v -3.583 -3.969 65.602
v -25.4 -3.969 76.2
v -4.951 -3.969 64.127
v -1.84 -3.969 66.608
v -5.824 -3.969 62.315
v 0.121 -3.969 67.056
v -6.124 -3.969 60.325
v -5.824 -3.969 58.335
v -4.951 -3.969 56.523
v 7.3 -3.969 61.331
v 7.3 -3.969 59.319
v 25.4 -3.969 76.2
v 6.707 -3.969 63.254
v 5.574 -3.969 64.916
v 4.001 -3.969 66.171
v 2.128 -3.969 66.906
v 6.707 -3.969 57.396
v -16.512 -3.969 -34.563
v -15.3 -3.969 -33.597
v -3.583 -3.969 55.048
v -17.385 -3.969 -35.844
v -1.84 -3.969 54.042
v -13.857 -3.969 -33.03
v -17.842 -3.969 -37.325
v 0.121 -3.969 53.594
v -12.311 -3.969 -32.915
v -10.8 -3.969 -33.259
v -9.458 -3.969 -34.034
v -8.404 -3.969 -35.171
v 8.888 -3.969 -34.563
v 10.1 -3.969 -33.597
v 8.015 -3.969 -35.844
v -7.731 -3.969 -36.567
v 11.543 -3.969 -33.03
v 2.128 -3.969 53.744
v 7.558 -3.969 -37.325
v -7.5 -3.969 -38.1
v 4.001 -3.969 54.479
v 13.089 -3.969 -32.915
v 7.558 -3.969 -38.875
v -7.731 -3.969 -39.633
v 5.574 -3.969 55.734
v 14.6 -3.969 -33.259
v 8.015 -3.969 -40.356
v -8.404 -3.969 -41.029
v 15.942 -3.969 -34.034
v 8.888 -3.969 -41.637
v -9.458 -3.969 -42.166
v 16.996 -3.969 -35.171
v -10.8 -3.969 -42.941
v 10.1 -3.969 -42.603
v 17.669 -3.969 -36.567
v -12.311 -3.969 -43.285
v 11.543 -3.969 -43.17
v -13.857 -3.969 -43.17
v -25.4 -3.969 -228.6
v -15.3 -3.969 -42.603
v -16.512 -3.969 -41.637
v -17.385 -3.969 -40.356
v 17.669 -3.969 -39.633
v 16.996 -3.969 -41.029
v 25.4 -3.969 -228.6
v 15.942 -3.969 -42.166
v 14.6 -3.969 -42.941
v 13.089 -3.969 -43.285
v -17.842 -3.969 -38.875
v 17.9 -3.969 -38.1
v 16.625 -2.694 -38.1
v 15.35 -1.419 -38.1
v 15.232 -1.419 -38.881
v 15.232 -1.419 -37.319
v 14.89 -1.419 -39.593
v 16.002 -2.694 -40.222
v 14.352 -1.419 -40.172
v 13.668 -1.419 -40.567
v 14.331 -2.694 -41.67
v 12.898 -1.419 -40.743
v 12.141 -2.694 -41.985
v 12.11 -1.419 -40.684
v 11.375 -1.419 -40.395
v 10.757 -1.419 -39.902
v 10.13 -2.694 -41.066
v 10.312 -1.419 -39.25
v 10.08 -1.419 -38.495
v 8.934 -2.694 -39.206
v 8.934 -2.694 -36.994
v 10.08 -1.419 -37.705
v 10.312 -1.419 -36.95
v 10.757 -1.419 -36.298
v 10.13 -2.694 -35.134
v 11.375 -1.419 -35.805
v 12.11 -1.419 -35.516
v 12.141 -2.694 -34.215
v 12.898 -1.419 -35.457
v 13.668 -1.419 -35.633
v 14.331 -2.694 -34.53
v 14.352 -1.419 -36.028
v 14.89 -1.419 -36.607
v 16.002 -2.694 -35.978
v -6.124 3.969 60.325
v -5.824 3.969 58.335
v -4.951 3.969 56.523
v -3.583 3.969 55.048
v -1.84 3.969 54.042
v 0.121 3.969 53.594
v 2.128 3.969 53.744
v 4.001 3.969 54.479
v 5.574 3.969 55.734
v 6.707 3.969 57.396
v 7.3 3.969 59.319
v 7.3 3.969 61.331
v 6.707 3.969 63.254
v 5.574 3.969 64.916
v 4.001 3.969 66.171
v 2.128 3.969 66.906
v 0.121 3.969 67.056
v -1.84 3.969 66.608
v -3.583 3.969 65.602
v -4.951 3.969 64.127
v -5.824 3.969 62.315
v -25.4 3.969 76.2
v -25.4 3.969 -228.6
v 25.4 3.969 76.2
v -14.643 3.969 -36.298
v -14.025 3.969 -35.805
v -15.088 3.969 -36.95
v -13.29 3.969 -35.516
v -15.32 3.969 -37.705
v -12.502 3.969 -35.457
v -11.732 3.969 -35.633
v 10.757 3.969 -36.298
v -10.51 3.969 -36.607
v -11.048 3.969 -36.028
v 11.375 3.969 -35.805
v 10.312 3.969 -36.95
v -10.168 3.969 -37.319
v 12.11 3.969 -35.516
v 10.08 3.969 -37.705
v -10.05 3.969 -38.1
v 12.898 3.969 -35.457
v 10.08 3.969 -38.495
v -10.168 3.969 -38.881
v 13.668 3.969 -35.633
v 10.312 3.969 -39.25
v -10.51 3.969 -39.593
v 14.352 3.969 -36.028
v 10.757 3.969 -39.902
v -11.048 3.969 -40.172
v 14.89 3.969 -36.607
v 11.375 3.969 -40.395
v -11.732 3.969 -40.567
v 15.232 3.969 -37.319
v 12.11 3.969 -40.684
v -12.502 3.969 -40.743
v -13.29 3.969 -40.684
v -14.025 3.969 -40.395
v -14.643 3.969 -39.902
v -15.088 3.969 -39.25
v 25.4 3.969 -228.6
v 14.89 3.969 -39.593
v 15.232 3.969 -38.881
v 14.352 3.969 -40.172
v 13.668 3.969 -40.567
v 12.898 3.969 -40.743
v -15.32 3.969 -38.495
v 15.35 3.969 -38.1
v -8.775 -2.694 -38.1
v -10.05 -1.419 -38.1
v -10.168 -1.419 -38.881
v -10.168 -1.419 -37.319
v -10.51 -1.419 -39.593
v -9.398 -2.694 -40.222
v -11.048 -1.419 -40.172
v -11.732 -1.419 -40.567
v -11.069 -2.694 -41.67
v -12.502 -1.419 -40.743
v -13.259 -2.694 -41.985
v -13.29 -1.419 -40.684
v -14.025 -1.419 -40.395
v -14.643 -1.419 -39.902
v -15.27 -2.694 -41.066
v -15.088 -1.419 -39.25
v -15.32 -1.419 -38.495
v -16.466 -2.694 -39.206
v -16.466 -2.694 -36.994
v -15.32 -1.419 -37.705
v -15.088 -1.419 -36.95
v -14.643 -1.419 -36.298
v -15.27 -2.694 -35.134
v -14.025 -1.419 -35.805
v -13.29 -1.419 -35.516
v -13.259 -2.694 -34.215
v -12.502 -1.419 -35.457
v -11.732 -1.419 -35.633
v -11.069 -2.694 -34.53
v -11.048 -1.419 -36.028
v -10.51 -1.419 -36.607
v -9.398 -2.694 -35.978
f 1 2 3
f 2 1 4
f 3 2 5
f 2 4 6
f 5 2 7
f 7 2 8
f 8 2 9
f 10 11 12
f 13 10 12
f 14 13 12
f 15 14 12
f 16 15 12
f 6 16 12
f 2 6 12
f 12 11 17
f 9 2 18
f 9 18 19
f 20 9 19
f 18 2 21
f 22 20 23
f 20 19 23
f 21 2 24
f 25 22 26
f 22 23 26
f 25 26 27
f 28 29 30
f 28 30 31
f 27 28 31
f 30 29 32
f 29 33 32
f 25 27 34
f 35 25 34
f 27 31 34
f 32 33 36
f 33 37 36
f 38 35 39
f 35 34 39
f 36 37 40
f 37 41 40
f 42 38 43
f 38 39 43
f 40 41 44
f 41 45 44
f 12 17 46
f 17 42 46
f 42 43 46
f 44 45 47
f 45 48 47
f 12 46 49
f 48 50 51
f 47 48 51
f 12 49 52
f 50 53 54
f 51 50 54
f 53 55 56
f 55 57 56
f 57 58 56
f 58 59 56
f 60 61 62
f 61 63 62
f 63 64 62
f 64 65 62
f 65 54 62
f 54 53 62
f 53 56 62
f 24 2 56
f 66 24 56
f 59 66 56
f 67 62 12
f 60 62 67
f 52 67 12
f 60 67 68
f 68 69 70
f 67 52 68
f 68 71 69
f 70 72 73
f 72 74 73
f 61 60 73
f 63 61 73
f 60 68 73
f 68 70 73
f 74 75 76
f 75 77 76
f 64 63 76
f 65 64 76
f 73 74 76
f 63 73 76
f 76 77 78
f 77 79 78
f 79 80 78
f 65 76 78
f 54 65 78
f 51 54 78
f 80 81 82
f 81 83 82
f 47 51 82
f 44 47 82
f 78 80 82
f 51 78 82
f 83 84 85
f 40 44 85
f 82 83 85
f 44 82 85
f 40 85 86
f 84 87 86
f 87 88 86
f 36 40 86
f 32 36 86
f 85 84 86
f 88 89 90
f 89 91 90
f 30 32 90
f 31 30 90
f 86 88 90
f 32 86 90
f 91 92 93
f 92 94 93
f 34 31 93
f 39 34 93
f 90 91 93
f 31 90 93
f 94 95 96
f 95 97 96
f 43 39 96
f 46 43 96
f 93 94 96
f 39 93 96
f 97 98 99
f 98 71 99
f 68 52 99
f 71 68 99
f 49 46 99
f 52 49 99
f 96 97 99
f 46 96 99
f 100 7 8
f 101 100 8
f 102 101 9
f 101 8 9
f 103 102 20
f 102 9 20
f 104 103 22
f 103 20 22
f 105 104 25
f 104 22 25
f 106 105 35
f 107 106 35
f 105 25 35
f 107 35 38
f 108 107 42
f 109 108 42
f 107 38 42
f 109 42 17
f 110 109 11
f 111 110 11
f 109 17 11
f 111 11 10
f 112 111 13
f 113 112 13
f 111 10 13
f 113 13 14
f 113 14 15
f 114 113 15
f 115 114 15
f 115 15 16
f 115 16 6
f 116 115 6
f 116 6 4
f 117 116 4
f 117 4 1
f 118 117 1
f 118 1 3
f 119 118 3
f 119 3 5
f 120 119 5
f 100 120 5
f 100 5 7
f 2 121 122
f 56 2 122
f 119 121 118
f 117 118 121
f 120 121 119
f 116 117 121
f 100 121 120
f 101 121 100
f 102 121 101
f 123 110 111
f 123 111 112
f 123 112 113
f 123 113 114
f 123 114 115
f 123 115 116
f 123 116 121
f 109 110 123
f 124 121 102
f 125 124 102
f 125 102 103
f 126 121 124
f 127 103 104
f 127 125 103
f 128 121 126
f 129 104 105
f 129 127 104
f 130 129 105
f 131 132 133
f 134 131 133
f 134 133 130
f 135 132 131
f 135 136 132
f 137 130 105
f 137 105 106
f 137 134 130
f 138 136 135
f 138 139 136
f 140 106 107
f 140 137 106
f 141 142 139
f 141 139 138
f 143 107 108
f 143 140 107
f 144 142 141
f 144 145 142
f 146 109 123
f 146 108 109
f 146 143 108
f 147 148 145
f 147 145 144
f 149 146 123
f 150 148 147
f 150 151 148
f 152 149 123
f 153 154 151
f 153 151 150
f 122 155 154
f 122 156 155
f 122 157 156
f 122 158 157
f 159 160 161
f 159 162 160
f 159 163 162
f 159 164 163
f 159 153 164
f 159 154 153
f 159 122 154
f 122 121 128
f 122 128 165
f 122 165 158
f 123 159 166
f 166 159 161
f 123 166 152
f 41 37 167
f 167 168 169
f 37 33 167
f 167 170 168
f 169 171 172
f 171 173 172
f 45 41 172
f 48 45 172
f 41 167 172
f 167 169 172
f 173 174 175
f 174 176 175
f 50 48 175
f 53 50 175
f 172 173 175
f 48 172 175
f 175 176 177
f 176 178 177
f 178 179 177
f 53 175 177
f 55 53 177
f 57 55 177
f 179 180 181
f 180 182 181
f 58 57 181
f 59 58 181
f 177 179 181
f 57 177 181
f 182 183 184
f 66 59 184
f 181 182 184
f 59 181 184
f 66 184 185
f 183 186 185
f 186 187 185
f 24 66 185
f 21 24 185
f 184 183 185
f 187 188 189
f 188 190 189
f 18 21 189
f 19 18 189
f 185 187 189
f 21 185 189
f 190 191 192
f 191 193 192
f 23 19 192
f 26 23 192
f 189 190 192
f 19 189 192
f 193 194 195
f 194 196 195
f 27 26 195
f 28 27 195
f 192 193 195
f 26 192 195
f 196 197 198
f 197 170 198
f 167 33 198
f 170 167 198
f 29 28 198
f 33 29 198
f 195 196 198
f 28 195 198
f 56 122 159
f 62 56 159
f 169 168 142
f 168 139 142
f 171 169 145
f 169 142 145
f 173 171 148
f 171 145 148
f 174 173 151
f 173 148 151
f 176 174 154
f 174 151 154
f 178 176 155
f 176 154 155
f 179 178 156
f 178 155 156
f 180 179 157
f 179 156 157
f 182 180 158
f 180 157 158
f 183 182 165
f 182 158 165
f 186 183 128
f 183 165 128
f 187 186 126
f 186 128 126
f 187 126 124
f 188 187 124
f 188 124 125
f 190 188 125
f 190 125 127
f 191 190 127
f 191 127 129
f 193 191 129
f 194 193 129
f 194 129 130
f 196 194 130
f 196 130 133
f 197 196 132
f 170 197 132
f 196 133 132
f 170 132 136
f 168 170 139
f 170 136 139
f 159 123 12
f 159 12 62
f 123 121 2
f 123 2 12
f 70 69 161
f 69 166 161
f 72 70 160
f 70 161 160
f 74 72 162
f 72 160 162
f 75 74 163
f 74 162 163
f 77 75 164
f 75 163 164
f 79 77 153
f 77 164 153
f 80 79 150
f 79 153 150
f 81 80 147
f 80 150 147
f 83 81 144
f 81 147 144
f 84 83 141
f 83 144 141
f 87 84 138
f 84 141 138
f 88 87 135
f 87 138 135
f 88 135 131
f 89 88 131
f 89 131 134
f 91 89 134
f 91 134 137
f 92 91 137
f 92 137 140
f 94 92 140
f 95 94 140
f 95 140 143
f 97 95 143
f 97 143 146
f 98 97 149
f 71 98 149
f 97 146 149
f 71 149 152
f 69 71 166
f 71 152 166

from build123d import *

# Parameters (mm, degrees)
BOSS_EXTRUDE1_DEPTH                             = 76.2
BOSS_EXTRUDE1_DEPTH_BACK                        = 76.2
SKETCH3_W                                       = 50.8
SKETCH3_H                                       = 7.9375
M12_CLEARANCE_HOLE2_D                           = 13.5
CSK_FOR_M5_FLAT_HEAD_MACHINE_SCREW1_D           = 5.3
CSK_FOR_M5_FLAT_HEAD_MACHINE_SCREW1_CSINK_D     = 10.4
CSK_FOR_M5_FLAT_HEAD_MACHINE_SCREW1_CSINK_ANGLE = 90
SKETCH26_W                                      = 50.8
SKETCH26_H                                      = 152.4
BOSS_EXTRUDE2_DEPTH                             = 7.9375


with BuildPart() as part:
    # Sketch3 → Boss-Extrude1 (new, two sides: drawn at the far end of the back side and taken through both)
    with BuildSketch(Plane.XY.offset(-BOSS_EXTRUDE1_DEPTH_BACK)):
        Rectangle(SKETCH3_W, SKETCH3_H)
    extrude(amount=BOSS_EXTRUDE1_DEPTH + BOSS_EXTRUDE1_DEPTH_BACK)

    # M12 Clearance Hole2 (through all)
    with Locations(Plane(origin=(0, 3.96875, 0), x_dir=(1, 0, 0), z_dir=(0, 1, 0))):
        with Locations((0.625840615, -60.325)):
            Hole(M12_CLEARANCE_HOLE2_D / 2)

    # CSK for M5 Flat Head Machine Screw1 (through all)
    with Locations(Plane(origin=(0, -3.96875, 0), x_dir=(-1, 0, 0), z_dir=(0, -1, 0))):
        with Locations((-12.7, 38.1), (12.7, 38.1)):
            CounterSinkHole(CSK_FOR_M5_FLAT_HEAD_MACHINE_SCREW1_D / 2, CSK_FOR_M5_FLAT_HEAD_MACHINE_SCREW1_CSINK_D / 2, counter_sink_angle=CSK_FOR_M5_FLAT_HEAD_MACHINE_SCREW1_CSINK_ANGLE)

    # Sketch26 → Boss-Extrude2 (add)
    with BuildSketch(Plane(origin=(0, 3.96875, 0), x_dir=(1, 0, 0), z_dir=(0, 1, 0))):
        with Locations((0, 152.4)):
            Rectangle(SKETCH26_W, SKETCH26_H)
    extrude(amount=-BOSS_EXTRUDE2_DEPTH)


solid = part.part
